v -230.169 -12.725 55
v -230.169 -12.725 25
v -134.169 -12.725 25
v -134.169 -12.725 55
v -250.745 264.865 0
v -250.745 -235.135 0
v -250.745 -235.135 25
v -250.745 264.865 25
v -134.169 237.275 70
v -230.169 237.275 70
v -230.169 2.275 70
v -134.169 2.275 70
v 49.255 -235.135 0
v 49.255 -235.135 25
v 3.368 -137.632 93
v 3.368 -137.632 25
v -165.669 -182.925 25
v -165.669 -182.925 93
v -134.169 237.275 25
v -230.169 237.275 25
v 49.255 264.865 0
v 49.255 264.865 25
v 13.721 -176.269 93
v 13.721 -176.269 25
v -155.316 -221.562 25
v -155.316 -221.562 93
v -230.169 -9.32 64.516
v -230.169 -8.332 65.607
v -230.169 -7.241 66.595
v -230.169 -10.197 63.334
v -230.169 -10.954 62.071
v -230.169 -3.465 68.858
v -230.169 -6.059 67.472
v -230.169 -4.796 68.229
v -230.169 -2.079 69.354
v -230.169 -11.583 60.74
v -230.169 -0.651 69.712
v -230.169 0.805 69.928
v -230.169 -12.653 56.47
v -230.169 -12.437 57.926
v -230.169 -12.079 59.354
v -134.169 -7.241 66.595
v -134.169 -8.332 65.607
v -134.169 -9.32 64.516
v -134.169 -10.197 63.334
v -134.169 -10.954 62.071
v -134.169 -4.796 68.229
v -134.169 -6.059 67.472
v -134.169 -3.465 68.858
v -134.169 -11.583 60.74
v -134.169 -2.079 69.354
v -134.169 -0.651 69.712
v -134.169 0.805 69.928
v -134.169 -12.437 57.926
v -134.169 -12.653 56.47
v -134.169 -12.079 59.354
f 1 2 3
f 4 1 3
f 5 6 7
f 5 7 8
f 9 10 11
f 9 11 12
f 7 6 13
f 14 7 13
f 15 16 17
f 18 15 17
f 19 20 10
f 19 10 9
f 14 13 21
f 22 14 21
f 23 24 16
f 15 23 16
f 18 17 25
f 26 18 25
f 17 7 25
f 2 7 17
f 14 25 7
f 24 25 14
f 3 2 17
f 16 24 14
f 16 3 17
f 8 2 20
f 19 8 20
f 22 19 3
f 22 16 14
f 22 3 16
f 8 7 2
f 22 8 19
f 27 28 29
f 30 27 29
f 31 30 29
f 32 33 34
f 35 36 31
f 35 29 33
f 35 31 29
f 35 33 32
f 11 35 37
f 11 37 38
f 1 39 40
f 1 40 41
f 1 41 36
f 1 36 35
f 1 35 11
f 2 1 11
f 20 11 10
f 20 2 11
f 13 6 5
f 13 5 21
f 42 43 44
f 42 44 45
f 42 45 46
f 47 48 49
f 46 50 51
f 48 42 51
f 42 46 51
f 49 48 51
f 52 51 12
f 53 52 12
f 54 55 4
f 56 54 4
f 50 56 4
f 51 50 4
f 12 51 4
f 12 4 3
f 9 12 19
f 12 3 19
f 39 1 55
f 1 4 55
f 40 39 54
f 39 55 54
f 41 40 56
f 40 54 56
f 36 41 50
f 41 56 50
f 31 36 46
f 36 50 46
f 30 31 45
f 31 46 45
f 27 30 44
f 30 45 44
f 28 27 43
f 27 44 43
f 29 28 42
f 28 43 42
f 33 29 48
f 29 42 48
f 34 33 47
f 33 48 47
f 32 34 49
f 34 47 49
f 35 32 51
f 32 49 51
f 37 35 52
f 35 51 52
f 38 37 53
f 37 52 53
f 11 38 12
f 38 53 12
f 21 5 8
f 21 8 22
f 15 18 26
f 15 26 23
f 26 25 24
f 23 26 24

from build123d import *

# Parameters (mm, degrees)
F0_W     = 300
F0_H     = 500
F1_DEPTH = 25
F2_W     = 96
F2_H     = 250
F3_DEPTH = 45
F5_DEPTH = 68
F6_R     = 15


with BuildPart() as f1:
    # F0 (on Top) → F1 (new body)
    with BuildSketch(Plane.XY):
        with Locations((-100.745436, 14.865042)):
            Rectangle(F0_W, F0_H)
    extrude(amount=F1_DEPTH)

    # F2 (on face) → F3 (join)
    with BuildSketch(Plane.XY.offset(25)):
        with Locations((-182.168748, 112.275026)):
            Rectangle(F2_W, F2_H)
    extrude(amount=F3_DEPTH)

    # F4 (on face) → F5 (join)
    with BuildSketch(Plane.XY.offset(25)):
        Polygon((3.368272, -137.631641), (-165.668748, -182.924974), (-155.315986, -221.562007), (13.721034, -176.268674), align=None)
    extrude(amount=F5_DEPTH)

    # F6
    f6_edges = [f1.edges().sort_by_distance(p)[0] for p in [
        (-182.168748, -12.724974, 70),
    ]]
    fillet(f6_edges, radius=F6_R)


solid = f1.part
